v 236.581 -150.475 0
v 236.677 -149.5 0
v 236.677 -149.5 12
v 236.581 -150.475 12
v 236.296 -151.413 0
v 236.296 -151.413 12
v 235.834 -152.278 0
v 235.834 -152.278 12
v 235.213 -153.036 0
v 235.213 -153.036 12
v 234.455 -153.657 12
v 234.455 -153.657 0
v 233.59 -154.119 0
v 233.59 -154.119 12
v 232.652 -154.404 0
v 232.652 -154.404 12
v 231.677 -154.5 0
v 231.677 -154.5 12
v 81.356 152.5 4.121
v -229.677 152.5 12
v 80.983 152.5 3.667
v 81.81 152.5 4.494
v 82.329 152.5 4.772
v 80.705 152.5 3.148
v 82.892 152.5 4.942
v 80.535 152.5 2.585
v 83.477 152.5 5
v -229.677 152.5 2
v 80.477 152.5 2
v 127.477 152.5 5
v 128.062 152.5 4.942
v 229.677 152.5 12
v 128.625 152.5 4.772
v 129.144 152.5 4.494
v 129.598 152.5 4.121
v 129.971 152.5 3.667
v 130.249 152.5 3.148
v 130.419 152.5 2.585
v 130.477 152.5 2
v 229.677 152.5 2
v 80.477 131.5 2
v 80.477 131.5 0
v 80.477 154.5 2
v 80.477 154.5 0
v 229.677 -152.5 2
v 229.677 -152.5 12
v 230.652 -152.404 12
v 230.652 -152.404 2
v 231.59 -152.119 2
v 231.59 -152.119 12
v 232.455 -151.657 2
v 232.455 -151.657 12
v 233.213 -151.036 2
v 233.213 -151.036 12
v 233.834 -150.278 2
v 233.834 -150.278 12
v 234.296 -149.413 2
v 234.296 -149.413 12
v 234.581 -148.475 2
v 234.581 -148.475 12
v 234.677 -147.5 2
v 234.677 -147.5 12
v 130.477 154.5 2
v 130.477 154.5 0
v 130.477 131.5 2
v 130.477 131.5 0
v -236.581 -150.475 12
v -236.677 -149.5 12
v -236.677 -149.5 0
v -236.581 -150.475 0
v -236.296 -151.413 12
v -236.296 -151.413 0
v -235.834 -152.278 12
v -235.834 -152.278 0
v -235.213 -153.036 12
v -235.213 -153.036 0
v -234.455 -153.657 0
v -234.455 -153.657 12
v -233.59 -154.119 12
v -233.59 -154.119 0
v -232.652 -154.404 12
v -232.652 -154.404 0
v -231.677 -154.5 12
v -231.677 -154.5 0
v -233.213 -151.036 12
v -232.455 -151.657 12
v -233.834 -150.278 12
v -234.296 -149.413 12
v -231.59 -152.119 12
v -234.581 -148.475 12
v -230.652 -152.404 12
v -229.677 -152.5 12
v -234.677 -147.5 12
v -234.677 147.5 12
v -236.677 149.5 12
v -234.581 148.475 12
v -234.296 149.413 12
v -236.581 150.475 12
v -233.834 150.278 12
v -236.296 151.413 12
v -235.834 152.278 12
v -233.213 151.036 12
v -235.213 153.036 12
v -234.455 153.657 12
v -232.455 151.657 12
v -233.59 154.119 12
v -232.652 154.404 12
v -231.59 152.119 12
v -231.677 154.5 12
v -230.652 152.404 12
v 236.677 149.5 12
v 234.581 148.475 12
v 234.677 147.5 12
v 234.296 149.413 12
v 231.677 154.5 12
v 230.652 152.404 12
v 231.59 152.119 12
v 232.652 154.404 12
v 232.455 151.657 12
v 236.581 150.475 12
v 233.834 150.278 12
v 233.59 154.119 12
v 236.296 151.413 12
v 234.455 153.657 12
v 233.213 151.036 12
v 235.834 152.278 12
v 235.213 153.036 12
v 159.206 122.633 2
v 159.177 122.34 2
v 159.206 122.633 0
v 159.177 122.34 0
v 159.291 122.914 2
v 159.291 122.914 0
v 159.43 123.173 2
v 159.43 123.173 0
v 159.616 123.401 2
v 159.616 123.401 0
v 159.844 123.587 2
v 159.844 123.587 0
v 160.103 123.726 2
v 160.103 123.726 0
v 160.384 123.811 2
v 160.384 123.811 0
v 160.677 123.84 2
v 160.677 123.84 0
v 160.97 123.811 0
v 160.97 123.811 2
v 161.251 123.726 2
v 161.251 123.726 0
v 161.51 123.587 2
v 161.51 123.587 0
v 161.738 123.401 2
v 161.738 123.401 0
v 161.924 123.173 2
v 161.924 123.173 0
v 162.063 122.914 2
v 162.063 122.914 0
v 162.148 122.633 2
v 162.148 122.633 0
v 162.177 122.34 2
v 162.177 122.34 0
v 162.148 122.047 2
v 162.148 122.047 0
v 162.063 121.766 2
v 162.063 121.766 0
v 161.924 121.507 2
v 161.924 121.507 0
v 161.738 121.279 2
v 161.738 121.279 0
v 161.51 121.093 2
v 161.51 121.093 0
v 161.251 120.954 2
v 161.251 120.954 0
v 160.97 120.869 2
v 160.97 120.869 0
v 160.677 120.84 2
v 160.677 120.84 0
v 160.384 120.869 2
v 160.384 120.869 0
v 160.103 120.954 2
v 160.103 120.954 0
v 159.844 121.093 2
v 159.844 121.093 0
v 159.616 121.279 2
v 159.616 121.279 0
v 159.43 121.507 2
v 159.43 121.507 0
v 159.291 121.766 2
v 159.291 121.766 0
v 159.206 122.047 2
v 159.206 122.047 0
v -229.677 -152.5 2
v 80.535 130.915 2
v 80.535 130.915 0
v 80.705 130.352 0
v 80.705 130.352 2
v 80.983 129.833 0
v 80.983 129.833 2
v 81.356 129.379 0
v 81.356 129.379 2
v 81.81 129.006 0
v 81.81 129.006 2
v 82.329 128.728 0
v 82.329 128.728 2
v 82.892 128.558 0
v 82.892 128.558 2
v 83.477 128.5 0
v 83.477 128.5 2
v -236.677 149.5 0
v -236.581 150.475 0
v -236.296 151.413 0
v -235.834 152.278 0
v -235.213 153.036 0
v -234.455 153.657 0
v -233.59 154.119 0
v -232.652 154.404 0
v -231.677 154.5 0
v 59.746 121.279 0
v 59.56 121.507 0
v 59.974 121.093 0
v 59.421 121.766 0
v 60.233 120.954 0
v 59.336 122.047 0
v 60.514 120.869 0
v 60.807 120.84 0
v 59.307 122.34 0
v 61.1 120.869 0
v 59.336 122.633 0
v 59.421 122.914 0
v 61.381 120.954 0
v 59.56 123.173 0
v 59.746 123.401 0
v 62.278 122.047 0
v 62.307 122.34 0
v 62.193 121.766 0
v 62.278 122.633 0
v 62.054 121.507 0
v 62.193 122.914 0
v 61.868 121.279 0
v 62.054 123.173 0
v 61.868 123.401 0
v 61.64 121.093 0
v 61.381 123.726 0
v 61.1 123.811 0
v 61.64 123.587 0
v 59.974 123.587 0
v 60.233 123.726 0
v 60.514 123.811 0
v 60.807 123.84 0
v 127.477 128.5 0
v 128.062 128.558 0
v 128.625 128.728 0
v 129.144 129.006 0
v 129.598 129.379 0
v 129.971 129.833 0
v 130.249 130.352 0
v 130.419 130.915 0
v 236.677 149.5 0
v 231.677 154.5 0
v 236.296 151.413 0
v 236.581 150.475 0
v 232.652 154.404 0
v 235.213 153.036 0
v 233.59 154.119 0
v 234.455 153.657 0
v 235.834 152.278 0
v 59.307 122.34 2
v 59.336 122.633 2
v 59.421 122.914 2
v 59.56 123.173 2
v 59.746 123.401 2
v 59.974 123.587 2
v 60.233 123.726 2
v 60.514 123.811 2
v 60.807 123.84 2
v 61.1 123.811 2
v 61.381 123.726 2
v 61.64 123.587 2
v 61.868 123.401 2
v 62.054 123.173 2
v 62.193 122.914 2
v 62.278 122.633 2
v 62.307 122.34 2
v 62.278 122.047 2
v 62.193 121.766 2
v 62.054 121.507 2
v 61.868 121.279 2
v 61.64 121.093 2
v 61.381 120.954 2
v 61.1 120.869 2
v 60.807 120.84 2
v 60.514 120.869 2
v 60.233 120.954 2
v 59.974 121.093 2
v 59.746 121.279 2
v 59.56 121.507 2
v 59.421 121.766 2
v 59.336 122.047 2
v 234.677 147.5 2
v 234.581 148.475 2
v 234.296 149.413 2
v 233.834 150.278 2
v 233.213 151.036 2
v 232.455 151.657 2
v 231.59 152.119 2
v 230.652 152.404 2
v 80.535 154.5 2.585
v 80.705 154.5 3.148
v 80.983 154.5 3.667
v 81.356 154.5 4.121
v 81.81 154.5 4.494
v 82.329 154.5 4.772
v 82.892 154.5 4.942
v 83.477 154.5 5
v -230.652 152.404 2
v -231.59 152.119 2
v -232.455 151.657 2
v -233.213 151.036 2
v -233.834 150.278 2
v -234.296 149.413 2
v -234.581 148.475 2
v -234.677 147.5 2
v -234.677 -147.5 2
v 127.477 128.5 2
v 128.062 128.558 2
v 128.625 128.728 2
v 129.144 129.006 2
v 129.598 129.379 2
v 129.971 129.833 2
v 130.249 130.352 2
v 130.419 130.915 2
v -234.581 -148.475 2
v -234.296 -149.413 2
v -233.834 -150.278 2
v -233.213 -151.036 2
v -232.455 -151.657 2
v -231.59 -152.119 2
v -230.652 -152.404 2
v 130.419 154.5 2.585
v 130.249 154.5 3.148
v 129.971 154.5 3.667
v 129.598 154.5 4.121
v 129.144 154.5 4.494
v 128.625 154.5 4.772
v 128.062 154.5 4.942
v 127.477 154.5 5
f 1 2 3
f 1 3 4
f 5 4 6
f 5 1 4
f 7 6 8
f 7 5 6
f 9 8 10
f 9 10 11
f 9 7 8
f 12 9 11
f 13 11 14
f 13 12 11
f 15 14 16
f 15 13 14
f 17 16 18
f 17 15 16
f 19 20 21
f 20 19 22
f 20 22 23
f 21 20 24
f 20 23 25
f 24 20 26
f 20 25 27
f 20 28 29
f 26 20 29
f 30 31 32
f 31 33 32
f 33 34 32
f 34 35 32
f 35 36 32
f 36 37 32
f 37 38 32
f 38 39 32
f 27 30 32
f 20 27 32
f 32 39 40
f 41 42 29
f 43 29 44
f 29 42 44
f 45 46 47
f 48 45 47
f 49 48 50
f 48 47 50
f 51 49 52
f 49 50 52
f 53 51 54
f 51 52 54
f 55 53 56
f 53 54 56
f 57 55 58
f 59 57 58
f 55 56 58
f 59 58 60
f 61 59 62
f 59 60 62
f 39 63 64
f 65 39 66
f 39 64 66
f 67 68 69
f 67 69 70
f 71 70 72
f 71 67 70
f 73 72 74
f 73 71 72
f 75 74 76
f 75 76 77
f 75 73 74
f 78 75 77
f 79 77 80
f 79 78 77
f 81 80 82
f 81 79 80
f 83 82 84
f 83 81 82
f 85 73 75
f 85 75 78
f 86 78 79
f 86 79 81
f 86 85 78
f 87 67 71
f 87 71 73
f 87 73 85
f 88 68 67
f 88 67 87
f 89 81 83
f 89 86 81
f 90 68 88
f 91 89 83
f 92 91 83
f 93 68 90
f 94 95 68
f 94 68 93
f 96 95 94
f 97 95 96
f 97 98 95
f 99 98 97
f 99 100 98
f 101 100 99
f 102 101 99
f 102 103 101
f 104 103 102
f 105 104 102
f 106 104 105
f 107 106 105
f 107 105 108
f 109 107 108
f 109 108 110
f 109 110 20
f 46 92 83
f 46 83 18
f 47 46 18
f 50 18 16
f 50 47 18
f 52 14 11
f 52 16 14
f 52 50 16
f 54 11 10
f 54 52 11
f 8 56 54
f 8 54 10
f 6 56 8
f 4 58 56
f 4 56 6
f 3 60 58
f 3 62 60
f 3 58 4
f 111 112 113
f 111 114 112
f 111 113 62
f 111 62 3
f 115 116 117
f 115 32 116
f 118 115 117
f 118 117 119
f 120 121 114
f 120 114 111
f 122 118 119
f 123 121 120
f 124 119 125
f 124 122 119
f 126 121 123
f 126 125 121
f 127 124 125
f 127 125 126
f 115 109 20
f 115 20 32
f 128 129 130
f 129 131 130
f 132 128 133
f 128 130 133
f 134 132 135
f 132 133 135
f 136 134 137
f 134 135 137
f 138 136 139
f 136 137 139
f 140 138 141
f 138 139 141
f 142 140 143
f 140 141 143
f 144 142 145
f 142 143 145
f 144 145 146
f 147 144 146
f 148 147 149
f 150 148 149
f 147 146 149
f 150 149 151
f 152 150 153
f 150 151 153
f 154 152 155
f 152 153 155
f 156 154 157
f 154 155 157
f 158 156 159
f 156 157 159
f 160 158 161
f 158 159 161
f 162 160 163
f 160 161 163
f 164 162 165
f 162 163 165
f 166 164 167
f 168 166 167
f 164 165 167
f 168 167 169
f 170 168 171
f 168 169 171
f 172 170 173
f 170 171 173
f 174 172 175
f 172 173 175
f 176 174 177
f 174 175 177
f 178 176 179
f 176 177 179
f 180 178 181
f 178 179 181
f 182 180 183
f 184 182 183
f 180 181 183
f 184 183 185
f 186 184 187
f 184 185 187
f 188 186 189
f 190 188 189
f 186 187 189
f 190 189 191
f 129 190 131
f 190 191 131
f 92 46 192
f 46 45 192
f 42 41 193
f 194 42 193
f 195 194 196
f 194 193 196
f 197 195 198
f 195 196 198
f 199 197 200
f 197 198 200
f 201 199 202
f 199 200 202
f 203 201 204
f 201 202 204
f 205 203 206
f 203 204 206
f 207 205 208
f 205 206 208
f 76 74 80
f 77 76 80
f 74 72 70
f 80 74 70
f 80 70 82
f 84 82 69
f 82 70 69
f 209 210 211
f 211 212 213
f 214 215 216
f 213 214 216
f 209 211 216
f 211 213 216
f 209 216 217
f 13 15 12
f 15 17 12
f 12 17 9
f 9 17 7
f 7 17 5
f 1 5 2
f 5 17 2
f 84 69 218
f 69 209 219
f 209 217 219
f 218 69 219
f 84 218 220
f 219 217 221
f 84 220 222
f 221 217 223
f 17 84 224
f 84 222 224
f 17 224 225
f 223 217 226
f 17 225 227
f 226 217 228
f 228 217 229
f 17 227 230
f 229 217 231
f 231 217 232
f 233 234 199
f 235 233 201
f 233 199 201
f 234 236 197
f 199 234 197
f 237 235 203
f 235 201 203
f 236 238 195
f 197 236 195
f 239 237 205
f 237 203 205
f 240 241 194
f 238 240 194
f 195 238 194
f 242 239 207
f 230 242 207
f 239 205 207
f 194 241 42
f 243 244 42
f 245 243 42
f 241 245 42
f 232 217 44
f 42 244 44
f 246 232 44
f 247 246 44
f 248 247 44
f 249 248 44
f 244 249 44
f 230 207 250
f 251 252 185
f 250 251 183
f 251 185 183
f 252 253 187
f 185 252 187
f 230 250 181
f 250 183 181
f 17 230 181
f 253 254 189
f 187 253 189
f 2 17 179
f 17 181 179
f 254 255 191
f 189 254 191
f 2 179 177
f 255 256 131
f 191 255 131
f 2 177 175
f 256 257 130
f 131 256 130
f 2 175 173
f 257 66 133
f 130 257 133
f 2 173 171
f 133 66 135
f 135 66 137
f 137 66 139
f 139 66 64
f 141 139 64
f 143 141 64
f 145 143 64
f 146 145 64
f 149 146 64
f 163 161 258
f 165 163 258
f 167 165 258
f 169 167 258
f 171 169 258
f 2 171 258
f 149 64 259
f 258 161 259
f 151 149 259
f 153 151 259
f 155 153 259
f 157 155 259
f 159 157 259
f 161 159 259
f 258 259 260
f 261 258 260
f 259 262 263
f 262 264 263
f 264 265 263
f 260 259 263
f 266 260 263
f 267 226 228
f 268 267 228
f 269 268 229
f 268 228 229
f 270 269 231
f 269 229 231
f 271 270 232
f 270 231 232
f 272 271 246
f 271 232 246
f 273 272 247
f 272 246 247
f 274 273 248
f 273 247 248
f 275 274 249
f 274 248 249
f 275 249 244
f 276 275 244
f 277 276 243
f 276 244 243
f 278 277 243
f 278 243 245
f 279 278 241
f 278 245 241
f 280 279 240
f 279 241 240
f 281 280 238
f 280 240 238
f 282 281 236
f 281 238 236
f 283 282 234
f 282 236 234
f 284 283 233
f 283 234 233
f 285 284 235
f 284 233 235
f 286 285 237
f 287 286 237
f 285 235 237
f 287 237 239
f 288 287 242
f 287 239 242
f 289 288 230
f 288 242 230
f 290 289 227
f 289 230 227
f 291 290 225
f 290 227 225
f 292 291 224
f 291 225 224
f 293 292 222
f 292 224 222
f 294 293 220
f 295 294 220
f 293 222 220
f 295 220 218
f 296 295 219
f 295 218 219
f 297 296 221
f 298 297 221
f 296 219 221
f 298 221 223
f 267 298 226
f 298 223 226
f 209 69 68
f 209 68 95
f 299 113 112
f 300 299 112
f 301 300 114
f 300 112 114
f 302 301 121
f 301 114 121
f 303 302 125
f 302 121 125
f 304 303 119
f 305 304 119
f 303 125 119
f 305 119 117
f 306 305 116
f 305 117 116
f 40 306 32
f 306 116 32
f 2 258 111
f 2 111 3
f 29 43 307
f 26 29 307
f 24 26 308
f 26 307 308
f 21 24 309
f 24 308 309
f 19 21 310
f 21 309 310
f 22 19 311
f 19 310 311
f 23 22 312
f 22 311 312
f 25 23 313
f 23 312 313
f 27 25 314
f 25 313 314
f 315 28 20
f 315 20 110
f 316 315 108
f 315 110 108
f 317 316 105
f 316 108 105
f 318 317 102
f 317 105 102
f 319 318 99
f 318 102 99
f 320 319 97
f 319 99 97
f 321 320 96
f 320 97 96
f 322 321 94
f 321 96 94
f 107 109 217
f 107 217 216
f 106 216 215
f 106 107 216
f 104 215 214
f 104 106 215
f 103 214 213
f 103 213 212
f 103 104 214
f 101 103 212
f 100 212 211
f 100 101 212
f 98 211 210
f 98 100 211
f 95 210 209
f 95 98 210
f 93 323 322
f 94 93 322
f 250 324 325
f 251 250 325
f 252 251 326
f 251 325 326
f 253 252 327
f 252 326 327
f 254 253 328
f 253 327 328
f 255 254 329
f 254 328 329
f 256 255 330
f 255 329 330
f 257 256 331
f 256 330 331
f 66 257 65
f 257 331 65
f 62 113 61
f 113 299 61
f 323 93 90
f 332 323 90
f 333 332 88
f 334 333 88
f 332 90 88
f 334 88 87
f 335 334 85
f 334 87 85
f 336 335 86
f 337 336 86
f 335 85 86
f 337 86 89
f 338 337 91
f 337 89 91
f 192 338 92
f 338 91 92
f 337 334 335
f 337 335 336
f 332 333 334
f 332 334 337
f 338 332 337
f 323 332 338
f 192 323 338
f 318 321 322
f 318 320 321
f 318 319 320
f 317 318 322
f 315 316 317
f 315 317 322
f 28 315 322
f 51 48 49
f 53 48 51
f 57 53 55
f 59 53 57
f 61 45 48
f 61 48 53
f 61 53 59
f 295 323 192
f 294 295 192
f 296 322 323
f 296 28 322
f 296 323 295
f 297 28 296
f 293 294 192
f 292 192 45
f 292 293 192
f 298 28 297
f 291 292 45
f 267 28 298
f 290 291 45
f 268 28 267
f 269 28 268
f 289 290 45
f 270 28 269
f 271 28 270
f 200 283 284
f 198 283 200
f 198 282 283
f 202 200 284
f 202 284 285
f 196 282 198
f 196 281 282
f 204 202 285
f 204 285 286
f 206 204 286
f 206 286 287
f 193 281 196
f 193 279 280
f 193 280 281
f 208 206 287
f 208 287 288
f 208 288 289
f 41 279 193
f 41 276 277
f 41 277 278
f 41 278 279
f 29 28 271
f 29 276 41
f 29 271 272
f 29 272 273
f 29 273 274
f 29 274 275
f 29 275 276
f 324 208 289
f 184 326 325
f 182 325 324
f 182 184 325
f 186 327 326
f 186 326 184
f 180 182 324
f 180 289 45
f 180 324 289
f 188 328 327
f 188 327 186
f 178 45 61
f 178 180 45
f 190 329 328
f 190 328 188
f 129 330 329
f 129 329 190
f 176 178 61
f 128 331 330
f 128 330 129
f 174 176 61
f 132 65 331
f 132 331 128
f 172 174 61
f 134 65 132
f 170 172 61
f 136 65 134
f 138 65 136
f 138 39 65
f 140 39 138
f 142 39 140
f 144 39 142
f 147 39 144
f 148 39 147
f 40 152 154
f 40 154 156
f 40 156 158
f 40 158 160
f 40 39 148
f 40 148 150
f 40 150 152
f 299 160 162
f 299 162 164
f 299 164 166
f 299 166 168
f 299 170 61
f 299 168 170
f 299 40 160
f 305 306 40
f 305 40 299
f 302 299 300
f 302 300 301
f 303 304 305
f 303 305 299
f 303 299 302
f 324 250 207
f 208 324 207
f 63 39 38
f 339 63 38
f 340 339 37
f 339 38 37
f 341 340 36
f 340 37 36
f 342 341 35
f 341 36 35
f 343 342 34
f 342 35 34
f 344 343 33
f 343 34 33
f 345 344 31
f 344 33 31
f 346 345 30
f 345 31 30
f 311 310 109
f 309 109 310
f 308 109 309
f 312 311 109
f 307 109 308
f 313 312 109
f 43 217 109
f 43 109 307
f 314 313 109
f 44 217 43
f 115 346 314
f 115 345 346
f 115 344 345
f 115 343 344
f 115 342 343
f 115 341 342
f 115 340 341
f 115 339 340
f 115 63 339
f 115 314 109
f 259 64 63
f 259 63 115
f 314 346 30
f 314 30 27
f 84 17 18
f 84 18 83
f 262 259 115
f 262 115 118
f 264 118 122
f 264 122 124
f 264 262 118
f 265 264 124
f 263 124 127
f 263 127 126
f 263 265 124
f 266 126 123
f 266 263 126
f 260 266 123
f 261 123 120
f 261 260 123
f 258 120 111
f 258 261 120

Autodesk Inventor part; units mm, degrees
ref_plane "YZ Plane" through (0, 0, 0) normal (1, 0, 0) x (0, 1, 0)
ref_plane "XZ Plane" through (0, 0, 0) normal (0, 1, 0) x (-1, 0, 0)
ref_plane "XY Plane" through (0, 0, 0) normal (0, 0, 1) x (1, 0, 0)
sketch "Sketch1" plane through (0, 0, 0) normal (0, 0, 1) x (1, 0, 0)
  line L0 (-236.677, 154.5) -> (236.677, 154.5)
  line L1 (236.677, 154.5) -> (236.677, -154.5)
  line L2 (236.677, -154.5) -> (-236.677, -154.5)
  line L3 (-236.677, -154.5) -> (-236.677, 154.5)
  point P0 (0, 0)
  point P1 (0, 154.5)
  point P2 (-236.677, 0)
  dimension "d0" = 473.354
  dimension "d1" = 309
extrude "Extrusion1" add sketch "Sketch1" along normal blind 2
sketch "Sketch2" plane through (0, 0, 2) normal (0, 0, 1) x (1, 0, 0)
  line L0 (-236.677, 154.5) -> (236.677, 154.5)
  line L1 (236.677, 154.5) -> (236.677, -154.5)
  line L2 (236.677, -154.5) -> (-236.677, -154.5)
  line L3 (-236.677, -154.5) -> (-236.677, 154.5)
  line L4 (-234.677, 152.5) -> (234.677, 152.5)
  line L5 (234.677, 152.5) -> (234.677, -152.5)
  line L6 (234.677, -152.5) -> (-234.677, -152.5)
  line L7 (-234.677, -152.5) -> (-234.677, 152.5)
  point P0 (0, 0)
  dimension "d4" = 2
extrude "Extrusion2" add sketch "Sketch2" along normal blind 10
fillet "Fillet1" radius 5 8 edges at (236.677, -154.5, 6) (234.677, -152.5, 7) (-236.677, -154.5, 6) (-234.677, -152.5, 7) (-234.677, 152.5, 7) (236.677, 154.5, 6) (234.677, 152.5, 7) (-236.677, 154.5, 6)
sketch "Sketch4" plane through (0, 0, 0) normal (0, 0, -1) x (-1, 0, 0)
  line L0 (-231.677, -154.5) -> (231.677, -154.5)
  line L1 (236.677, -149.5) -> (236.677, 149.5)
  line L2 (-80.477, 154.5) -> (-130.477, 154.5)
  line L3 (-130.477, 154.5) -> (-130.477, 128.5)
  line L4 (-130.477, 128.5) -> (-80.477, 128.5)
  line L5 (-80.477, 128.5) -> (-80.477, 154.5)
  line L6 (231.677, 154.5) -> (-231.677, 154.5) projected
  line L7 (-236.677, 149.5) -> (-236.677, -149.5) projected
  circle A0 centre (-60.807, 122.34) radius 1.5
  circle A1 centre (-160.677, 122.34) radius 1.5
  point P0 (0, 0)
  point P1 (0, 0)
  dimension "d24" = 50
  dimension "d25" = 106.2
  dimension "d26" = 3
  dimension "d27" = 3
  dimension "d28" = 32.16
  dimension "d29" = 99.87
  dimension "d30" = 76
  dimension "d33" = 26
extrude "Extrusion4" cut sketch "Sketch4" against normal blind 5
fillet "Fillet2" radius 3 4 edges at (80.477, 128.5, 1) (130.477, 128.5, 1) (130.477, 153.5, 5) (80.477, 153.5, 5)
properties part number "printer floor plate"
